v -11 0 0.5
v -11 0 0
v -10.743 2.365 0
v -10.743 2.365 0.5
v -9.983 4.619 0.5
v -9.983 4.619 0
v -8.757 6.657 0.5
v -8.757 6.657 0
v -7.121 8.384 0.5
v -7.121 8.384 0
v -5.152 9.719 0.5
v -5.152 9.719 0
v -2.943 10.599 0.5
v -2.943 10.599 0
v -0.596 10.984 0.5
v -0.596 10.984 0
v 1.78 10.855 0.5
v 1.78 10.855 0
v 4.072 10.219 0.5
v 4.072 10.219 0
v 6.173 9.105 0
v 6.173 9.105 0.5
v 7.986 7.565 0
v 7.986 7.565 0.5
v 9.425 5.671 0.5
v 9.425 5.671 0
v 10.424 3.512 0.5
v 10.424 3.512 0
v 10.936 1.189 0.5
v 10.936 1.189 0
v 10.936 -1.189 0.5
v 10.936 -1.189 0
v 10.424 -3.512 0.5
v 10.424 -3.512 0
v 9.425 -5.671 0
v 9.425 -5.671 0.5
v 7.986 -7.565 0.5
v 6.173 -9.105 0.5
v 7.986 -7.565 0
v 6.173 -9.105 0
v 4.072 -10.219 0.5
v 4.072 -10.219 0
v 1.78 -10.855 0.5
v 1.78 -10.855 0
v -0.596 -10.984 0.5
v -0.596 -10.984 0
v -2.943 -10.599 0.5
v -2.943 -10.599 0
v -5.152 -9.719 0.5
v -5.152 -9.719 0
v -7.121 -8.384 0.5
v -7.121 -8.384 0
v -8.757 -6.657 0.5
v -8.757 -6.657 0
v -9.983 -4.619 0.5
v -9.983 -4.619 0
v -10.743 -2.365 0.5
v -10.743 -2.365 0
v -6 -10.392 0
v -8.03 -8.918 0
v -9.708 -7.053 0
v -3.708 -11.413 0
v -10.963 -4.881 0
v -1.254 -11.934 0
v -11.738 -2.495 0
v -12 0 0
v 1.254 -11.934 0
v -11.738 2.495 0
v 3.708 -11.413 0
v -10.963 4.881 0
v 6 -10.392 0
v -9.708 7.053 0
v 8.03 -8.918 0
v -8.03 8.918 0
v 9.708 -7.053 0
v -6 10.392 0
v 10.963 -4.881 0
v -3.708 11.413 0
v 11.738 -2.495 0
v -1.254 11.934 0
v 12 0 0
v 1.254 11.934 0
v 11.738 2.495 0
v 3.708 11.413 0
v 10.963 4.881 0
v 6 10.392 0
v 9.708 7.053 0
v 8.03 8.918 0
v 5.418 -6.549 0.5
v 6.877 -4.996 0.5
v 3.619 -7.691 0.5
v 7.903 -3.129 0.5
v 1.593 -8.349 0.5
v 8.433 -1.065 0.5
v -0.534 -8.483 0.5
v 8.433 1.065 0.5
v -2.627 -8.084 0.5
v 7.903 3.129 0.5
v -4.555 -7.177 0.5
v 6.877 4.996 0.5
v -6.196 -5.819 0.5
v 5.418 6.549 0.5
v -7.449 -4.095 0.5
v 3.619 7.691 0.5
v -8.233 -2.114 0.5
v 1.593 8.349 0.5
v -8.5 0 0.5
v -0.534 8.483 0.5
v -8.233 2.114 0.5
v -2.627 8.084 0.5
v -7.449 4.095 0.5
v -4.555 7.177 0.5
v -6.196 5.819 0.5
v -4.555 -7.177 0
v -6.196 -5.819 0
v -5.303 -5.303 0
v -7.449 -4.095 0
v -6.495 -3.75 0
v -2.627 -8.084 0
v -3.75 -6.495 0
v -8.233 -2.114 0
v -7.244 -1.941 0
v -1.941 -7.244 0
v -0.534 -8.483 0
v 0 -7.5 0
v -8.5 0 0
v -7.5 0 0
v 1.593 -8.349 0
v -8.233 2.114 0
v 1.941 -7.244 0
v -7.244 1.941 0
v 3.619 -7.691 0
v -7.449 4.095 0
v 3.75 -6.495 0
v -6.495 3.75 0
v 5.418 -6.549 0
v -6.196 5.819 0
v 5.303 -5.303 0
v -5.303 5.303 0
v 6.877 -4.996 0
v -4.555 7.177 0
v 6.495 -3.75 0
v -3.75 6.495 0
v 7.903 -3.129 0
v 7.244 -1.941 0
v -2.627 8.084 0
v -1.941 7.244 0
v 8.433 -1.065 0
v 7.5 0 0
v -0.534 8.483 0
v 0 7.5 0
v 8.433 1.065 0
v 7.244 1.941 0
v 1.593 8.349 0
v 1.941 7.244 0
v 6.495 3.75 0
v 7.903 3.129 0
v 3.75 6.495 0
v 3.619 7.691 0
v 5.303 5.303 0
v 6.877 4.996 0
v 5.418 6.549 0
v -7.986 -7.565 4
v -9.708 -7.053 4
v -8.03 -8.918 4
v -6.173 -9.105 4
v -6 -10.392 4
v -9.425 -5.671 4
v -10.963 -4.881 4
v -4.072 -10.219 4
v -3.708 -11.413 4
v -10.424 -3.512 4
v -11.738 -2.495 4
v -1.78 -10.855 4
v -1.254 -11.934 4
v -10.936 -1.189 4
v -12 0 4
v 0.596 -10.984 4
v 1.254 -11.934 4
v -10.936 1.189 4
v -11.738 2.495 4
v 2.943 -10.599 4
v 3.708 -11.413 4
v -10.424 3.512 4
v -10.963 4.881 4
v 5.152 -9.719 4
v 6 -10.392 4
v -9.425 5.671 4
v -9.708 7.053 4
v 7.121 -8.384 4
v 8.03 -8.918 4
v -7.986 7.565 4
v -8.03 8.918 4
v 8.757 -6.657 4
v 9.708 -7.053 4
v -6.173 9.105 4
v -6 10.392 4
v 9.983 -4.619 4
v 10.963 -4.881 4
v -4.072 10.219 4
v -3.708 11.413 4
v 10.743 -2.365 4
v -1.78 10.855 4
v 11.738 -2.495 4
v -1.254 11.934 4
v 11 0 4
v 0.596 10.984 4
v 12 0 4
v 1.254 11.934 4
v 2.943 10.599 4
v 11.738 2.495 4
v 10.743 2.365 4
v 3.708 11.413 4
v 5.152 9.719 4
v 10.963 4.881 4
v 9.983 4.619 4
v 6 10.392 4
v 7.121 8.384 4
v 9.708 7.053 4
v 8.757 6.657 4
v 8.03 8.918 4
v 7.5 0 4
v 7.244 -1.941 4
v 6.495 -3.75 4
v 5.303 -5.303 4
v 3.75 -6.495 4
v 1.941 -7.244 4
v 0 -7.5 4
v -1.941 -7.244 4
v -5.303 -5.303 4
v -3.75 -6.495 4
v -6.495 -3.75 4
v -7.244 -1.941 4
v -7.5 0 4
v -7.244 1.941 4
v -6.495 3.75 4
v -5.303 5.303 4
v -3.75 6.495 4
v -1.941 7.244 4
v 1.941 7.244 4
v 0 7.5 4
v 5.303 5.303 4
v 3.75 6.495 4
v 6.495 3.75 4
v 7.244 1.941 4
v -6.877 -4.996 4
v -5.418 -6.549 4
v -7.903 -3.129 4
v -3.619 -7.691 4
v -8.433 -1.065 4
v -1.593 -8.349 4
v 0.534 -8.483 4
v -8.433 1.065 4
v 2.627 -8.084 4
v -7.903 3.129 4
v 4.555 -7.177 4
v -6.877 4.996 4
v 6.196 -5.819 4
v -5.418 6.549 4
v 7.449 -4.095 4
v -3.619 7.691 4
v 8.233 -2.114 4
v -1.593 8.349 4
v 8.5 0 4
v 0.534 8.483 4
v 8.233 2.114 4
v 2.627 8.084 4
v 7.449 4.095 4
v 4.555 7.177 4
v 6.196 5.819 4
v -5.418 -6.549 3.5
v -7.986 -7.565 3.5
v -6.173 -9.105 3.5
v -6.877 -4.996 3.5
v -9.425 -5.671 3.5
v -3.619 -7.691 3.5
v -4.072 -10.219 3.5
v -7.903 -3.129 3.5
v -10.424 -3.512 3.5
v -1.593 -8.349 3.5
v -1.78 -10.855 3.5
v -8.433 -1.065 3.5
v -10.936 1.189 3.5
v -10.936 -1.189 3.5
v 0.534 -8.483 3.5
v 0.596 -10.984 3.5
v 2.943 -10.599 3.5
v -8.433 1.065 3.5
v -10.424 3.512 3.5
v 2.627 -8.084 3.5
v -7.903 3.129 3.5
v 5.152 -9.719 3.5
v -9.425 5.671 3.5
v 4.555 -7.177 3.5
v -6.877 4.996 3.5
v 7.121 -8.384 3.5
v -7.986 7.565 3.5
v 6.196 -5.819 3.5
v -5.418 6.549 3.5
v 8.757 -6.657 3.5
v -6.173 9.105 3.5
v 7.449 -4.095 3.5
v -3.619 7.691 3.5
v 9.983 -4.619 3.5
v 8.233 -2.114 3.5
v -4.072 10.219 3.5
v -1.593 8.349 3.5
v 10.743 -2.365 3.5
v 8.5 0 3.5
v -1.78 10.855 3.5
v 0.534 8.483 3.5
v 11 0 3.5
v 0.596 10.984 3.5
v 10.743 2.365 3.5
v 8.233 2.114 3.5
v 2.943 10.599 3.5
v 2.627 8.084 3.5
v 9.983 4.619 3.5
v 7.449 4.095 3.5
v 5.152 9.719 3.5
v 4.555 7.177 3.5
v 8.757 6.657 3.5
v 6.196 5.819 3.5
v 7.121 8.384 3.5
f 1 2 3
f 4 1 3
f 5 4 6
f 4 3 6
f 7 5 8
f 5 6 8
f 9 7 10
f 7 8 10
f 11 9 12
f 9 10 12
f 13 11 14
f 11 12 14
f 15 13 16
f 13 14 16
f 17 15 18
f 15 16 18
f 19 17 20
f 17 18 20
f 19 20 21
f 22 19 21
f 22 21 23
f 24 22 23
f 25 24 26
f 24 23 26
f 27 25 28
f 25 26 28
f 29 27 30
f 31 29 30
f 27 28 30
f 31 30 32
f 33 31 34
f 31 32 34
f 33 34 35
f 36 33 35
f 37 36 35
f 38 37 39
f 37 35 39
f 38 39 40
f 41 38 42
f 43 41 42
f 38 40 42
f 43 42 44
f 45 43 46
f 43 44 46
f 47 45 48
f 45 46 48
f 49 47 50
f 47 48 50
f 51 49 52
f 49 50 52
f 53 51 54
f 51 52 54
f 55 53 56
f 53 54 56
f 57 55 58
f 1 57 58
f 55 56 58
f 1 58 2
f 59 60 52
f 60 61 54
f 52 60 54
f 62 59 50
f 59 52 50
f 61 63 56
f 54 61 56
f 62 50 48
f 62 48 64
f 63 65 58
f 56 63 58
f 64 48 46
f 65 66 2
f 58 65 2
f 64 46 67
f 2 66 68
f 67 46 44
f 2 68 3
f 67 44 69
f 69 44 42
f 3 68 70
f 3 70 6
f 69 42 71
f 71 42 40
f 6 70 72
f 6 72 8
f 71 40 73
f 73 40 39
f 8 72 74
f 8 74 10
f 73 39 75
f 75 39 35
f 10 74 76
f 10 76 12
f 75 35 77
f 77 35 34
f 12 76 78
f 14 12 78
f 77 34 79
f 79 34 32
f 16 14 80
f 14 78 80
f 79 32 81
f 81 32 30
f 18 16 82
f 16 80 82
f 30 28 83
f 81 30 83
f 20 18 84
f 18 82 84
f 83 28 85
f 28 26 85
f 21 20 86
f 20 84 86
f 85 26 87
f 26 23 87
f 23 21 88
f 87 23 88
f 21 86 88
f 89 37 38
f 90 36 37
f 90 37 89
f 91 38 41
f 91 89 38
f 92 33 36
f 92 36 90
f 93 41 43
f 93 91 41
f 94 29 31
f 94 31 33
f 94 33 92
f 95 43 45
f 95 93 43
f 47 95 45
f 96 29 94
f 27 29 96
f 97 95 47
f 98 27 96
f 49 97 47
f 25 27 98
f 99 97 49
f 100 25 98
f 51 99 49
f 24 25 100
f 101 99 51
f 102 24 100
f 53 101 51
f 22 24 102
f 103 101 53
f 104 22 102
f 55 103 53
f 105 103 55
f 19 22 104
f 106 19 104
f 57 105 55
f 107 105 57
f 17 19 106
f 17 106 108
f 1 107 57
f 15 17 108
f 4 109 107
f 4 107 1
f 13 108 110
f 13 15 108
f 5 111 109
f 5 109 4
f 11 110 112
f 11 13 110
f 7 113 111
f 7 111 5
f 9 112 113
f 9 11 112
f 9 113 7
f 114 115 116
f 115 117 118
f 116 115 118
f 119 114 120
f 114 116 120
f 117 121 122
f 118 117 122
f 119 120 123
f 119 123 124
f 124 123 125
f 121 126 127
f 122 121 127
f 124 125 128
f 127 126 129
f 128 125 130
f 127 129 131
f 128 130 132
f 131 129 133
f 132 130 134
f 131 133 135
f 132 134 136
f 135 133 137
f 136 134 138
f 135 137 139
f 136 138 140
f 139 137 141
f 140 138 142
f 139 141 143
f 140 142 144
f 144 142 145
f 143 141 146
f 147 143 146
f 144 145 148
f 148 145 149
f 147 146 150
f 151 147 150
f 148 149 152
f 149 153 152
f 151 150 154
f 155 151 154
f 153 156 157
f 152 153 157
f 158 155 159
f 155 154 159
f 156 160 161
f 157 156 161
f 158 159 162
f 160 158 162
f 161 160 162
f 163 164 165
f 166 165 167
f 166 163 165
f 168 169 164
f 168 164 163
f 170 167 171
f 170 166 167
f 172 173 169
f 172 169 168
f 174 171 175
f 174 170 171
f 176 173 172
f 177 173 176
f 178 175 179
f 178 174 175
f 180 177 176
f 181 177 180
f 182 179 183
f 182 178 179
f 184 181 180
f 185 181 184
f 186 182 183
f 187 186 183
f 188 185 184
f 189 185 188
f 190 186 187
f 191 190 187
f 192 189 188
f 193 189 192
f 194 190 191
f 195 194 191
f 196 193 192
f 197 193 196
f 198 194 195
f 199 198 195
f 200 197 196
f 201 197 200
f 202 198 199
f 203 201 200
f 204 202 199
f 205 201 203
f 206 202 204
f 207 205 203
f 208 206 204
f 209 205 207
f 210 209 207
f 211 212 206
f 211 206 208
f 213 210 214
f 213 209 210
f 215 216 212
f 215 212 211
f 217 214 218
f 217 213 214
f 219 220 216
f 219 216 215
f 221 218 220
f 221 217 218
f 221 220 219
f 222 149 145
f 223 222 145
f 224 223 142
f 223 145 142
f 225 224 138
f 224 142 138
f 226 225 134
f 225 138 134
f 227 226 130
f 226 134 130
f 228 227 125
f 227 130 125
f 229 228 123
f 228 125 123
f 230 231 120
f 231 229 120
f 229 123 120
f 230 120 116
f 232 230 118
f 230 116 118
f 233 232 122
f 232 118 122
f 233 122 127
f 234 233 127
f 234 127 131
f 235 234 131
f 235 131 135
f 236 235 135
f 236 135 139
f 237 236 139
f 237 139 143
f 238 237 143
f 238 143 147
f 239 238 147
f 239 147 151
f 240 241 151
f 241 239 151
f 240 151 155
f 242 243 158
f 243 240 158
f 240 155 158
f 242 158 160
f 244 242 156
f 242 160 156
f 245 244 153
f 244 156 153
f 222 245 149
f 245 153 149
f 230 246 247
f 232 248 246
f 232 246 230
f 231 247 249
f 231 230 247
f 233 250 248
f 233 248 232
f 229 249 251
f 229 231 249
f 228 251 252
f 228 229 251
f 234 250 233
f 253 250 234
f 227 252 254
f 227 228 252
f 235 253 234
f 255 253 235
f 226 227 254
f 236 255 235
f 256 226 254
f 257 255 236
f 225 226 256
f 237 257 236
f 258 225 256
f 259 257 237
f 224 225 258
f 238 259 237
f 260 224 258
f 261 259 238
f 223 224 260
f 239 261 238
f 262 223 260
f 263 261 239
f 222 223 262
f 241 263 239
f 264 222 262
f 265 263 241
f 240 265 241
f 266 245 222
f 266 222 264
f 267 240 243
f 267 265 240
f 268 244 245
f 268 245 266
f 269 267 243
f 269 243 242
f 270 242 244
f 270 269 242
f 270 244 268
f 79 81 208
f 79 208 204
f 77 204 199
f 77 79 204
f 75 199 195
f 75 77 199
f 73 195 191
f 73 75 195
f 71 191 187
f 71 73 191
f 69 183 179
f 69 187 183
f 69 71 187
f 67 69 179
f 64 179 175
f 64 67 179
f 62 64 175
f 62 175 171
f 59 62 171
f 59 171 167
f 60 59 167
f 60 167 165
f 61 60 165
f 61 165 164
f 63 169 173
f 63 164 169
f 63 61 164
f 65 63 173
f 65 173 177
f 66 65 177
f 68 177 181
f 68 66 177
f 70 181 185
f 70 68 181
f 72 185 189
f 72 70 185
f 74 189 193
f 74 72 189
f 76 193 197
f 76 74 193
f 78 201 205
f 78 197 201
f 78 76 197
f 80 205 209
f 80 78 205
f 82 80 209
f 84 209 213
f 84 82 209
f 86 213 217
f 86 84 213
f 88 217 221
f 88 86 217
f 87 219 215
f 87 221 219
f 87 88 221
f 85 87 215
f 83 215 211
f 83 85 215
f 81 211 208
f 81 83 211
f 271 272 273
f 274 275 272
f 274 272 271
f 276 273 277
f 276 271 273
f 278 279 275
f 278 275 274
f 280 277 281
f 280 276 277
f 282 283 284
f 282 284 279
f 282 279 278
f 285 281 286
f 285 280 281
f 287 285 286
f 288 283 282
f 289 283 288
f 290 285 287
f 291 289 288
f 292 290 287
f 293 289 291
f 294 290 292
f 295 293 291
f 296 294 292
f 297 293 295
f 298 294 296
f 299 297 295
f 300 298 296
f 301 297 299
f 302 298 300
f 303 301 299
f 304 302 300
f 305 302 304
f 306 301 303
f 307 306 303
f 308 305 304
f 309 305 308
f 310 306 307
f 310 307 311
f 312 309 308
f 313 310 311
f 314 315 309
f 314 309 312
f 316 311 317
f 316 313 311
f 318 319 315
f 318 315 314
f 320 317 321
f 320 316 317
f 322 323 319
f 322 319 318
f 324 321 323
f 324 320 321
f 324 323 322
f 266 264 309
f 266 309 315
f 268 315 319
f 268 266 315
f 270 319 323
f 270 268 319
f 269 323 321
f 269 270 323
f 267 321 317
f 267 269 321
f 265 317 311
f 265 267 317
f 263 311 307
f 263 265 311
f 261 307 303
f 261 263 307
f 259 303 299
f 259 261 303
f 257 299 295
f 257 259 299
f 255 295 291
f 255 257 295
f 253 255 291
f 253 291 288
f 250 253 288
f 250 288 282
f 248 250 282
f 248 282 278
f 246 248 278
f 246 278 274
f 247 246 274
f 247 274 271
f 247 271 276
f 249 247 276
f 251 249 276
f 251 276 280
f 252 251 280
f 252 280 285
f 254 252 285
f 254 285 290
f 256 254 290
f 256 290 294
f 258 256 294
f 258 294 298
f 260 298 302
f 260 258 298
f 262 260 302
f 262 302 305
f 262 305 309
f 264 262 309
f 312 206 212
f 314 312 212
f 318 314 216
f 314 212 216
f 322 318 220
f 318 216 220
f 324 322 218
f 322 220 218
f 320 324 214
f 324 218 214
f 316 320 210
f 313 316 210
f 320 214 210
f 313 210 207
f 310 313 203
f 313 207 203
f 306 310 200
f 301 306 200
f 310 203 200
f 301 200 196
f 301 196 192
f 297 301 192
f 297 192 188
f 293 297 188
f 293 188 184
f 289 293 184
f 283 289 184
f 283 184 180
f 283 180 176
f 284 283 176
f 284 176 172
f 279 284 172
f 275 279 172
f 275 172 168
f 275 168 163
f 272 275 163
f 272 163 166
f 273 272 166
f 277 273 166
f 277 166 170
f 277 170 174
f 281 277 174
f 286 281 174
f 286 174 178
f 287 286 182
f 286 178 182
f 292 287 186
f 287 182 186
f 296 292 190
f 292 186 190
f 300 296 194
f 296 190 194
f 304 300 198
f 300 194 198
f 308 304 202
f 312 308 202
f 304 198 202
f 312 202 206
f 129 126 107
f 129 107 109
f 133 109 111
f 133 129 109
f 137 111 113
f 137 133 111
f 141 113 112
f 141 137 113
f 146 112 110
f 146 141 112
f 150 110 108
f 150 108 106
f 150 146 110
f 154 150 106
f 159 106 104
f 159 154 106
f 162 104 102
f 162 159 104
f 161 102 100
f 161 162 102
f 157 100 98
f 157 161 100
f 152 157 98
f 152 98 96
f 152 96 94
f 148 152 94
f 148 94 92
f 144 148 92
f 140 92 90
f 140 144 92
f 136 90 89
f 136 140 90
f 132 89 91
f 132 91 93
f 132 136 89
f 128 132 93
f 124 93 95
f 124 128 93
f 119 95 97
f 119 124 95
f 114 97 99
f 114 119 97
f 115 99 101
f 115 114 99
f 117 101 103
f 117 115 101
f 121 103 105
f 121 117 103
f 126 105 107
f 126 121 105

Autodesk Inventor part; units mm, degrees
ref_plane "YZ Plane" through (0, 0, 0) normal (1, 0, 0) x (0, 1, 0)
ref_plane "XZ Plane" through (0, 0, 0) normal (0, 1, 0) x (-1, 0, 0)
ref_plane "XY Plane" through (0, 0, 0) normal (0, 0, 1) x (1, 0, 0)
sketch "スケッチ1" plane through (0, 0, 0) normal (0, 0, 1) x (1, 0, 0)
  circle A0 centre (0, 0) radius 7.5
  circle A1 centre (0, 0) radius 12
  dimension "d0" = 15
  dimension "d1" = 24
extrude "押し出し1" add sketch "スケッチ1" along normal blind 4
sketch "スケッチ2" plane through (0, 0, 4) normal (0, 0, 1) x (1, 0, 0)
  circle A0 centre (0, 0) radius 7.5 projected
  circle A1 centre (0, 0) radius 12 projected
  circle A2 centre (0, 0) radius 8.5
  circle A3 centre (0, 0) radius 11
  dimension "d4" = 1
  dimension "d5" = 1
extrude "押し出し2" cut sketch "スケッチ2" against normal blind 0.5 contours A3
sketch "スケッチ3" plane through (0, 0, 0) normal (0, 0, -1) x (-1, 0, 0)
  circle A0 centre (0, 0) radius 11 projected
  circle A1 centre (0, 0) radius 8.5 projected
extrude "押し出し3" cut sketch "スケッチ3" against normal blind 0.5
properties part number "ベアリングd15-D24-B4" material "鋼、炭素鋼"
